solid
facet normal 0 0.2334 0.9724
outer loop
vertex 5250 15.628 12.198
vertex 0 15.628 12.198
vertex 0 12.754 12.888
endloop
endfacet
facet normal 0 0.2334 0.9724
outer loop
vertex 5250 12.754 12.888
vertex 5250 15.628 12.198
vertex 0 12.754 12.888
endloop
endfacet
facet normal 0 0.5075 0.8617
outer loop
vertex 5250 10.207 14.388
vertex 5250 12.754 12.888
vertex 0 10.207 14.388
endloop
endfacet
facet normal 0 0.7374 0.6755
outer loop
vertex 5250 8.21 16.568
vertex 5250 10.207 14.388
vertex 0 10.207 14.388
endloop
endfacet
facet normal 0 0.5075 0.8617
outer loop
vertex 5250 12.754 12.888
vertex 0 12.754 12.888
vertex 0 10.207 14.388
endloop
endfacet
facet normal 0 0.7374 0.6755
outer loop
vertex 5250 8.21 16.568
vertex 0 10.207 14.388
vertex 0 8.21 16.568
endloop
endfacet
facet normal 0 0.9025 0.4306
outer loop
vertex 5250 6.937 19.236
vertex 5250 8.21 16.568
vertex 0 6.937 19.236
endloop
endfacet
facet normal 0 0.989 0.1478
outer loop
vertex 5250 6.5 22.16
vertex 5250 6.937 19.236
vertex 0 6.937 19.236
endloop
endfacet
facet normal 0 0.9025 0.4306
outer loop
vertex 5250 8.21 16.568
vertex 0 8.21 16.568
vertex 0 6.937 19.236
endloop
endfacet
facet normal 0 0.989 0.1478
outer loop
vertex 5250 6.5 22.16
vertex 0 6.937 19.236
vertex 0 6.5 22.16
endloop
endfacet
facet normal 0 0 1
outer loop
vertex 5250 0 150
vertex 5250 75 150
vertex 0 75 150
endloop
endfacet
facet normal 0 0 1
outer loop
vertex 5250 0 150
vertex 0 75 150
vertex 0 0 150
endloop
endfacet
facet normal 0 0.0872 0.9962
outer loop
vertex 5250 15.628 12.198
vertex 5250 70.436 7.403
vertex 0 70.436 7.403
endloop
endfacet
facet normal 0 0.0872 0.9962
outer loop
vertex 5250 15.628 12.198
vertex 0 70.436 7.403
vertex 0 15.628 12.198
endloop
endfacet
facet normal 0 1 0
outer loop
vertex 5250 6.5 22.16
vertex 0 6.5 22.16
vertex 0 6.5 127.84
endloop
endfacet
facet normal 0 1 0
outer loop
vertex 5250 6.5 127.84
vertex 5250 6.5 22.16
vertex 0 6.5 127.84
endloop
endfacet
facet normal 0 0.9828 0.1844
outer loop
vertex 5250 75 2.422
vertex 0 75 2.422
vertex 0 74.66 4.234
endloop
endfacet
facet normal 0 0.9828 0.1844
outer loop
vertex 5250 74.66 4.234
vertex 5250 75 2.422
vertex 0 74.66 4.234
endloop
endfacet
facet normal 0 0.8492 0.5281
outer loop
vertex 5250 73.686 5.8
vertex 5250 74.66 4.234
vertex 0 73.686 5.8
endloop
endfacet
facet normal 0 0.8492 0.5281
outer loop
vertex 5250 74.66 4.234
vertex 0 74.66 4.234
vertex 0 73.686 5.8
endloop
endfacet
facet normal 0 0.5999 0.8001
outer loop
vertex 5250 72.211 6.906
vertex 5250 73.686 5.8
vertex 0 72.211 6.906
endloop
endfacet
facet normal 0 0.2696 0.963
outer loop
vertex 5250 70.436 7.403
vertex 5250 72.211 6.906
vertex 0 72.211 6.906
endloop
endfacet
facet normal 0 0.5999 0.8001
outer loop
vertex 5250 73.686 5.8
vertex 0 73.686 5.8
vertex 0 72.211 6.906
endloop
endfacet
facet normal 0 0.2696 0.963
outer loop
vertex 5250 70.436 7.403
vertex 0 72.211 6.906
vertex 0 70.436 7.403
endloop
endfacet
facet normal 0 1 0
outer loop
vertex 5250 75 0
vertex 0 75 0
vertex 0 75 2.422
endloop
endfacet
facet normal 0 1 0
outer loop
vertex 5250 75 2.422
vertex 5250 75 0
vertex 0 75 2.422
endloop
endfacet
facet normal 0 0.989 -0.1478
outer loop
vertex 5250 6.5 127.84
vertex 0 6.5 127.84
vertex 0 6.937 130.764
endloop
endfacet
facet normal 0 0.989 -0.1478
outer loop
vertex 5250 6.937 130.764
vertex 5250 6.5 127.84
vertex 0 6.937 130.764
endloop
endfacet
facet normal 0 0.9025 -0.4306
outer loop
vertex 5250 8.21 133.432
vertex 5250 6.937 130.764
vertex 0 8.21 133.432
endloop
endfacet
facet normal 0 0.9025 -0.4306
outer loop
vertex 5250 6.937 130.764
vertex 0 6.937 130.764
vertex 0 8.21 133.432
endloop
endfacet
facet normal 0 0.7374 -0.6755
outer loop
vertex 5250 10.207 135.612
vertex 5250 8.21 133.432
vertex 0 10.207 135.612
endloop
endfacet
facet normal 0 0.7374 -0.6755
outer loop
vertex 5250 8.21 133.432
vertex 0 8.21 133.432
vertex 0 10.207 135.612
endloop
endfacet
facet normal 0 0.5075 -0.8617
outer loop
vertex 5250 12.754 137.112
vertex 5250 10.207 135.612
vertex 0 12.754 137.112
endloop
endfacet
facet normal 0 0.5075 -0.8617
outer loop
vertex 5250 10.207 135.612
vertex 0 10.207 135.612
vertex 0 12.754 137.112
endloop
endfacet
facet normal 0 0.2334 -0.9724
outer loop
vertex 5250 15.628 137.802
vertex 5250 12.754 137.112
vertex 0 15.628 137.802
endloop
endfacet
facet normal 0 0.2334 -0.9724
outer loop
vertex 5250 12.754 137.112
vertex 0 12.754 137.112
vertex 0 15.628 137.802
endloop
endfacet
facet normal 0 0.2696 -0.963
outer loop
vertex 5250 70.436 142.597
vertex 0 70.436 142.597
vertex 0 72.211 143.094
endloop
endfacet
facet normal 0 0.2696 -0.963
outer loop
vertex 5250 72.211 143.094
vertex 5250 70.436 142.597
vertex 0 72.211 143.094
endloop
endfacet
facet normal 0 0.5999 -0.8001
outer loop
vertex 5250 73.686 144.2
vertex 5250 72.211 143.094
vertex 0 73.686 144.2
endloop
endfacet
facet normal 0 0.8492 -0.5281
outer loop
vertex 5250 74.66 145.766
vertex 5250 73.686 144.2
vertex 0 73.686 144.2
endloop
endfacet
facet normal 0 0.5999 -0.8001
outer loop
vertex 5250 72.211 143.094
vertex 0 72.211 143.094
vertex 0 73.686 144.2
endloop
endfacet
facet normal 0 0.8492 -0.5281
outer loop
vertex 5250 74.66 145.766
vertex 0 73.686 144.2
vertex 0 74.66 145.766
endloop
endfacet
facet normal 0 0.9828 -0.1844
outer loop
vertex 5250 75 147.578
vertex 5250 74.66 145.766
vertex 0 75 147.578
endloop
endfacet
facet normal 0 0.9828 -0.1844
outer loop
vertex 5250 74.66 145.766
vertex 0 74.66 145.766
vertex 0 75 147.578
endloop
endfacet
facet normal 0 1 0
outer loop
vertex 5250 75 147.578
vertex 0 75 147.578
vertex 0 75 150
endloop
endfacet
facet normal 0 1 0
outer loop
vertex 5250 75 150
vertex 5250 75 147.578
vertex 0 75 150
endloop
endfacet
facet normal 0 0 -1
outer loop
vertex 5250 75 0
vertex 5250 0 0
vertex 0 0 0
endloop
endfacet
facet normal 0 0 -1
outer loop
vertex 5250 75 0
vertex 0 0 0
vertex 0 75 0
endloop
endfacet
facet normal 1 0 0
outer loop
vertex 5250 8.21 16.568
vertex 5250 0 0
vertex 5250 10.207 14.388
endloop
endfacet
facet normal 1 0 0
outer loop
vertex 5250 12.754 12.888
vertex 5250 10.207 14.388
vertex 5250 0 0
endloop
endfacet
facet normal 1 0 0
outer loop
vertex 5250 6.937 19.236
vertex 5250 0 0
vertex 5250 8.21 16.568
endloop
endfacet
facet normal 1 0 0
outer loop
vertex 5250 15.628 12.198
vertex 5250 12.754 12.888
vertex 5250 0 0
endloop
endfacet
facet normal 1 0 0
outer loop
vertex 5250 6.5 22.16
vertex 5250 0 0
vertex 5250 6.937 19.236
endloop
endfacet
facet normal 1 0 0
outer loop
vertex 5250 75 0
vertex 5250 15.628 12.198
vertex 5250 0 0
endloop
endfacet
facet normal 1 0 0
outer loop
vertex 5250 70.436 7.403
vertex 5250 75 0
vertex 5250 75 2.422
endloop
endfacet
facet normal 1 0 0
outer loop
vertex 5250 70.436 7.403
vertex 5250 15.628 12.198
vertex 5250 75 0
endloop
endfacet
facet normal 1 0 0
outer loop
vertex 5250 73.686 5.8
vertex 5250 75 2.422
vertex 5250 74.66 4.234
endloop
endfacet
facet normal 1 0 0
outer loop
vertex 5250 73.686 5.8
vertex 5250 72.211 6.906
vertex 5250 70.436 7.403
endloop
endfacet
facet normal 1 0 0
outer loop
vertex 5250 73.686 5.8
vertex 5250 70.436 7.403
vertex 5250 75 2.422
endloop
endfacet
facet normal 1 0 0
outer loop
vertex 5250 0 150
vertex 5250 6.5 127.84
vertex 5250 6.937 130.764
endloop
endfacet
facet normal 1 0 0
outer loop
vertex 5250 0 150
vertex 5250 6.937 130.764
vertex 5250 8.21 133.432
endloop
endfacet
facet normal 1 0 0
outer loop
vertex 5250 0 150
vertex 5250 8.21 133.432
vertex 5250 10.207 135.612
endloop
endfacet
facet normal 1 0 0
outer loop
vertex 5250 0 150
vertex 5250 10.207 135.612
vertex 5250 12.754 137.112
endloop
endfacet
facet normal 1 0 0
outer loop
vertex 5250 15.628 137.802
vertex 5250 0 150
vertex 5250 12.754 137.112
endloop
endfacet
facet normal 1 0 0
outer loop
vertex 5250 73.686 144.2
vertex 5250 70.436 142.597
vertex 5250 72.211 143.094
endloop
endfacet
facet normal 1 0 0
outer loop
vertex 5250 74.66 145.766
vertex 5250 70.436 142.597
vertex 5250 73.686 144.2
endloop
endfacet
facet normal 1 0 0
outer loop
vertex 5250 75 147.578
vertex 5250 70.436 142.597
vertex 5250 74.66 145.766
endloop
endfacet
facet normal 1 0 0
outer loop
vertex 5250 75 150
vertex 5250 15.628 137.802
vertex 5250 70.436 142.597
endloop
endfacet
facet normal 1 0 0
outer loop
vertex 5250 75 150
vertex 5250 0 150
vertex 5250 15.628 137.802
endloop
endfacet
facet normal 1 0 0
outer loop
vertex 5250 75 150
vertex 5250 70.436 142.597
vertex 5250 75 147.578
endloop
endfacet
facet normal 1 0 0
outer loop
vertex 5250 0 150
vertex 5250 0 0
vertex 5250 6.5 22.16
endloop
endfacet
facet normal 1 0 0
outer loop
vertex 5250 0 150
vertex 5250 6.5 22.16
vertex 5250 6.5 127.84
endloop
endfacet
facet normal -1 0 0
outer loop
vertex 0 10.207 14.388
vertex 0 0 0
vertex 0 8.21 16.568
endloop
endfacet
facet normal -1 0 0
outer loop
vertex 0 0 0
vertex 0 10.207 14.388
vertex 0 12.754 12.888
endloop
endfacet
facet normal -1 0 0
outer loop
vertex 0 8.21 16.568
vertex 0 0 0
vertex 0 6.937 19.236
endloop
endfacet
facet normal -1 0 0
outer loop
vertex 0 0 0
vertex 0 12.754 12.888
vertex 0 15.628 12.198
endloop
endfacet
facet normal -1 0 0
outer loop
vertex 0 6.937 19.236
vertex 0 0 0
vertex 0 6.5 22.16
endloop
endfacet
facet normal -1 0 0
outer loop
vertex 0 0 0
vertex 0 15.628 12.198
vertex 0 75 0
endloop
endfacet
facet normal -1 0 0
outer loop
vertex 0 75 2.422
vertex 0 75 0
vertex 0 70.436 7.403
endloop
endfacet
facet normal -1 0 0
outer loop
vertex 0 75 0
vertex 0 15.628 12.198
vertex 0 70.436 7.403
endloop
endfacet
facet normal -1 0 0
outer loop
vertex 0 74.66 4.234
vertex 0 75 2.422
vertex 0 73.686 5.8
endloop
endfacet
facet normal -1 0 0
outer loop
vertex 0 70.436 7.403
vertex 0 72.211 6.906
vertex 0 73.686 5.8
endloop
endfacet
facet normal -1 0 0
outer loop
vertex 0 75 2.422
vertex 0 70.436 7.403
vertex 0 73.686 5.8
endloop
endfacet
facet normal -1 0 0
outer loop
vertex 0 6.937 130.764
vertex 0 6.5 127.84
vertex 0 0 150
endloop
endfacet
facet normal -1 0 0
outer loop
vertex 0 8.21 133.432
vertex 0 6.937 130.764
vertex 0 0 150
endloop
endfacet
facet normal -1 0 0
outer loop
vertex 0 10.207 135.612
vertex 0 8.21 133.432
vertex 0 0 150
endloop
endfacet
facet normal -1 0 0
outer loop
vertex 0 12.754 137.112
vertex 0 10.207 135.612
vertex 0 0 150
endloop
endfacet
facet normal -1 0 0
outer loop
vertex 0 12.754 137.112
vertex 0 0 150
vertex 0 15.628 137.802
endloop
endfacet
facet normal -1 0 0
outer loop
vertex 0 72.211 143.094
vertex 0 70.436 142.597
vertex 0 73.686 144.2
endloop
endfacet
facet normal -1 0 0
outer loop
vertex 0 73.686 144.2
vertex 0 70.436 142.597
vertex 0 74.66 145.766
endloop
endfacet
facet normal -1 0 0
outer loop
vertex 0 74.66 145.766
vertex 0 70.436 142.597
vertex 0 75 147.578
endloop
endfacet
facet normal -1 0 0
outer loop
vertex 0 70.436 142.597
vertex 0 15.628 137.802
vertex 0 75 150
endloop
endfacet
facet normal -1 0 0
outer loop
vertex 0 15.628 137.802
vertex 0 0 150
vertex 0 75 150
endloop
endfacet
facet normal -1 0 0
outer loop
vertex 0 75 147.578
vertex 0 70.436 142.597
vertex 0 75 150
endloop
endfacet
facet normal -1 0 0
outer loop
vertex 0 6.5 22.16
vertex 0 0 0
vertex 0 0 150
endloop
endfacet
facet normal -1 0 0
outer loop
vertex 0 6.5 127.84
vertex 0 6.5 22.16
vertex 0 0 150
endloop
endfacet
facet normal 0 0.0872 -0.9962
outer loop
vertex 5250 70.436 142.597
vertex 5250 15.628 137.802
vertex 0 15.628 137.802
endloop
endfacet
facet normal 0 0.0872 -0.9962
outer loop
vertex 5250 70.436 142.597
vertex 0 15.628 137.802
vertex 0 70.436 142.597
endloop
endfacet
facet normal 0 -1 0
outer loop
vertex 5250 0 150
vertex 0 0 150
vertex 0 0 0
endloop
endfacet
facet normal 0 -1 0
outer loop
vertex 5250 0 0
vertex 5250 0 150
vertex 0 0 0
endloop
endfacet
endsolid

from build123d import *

# Parameters (mm, degrees)
C_KANAL_C_150_X_75_X_6_5_1_DEPTH = 5250


with BuildPart() as part:
    # Sketch1 → C kanal C 150 X 75 X 6.5(1) (new body)
    with BuildSketch(Plane.YZ):
        with BuildLine():
            Line((75, 150), (0, 150))
            Line((0, 150), (0, 0))
            Line((0, 0), (75, 0))
            Line((75, 0), (75, 2.421857404))
            ThreePointArc((75, 2.421857404), (73.686386684, 5.799808442), (70.435778714, 7.402830895))
            Line((70.435778714, 7.402830895), (15.628442573, 12.197851485))
            ThreePointArc((15.628442573, 12.197851485), (9.127226632, 15.40389639), (6.5, 22.159798466))
            Line((6.5, 22.159798466), (6.5, 127.840201534))
            ThreePointArc((6.5, 127.840201534), (9.127226632, 134.59610361), (15.628442573, 137.802148515))
            Line((15.628442573, 137.802148515), (70.435778714, 142.597169105))
            ThreePointArc((70.435778714, 142.597169105), (73.686386684, 144.200191558), (75, 147.578142596))
            Line((75, 147.578142596), (75, 150))
        make_face()
    extrude(amount=C_KANAL_C_150_X_75_X_6_5_1_DEPTH)


solid = part.part
